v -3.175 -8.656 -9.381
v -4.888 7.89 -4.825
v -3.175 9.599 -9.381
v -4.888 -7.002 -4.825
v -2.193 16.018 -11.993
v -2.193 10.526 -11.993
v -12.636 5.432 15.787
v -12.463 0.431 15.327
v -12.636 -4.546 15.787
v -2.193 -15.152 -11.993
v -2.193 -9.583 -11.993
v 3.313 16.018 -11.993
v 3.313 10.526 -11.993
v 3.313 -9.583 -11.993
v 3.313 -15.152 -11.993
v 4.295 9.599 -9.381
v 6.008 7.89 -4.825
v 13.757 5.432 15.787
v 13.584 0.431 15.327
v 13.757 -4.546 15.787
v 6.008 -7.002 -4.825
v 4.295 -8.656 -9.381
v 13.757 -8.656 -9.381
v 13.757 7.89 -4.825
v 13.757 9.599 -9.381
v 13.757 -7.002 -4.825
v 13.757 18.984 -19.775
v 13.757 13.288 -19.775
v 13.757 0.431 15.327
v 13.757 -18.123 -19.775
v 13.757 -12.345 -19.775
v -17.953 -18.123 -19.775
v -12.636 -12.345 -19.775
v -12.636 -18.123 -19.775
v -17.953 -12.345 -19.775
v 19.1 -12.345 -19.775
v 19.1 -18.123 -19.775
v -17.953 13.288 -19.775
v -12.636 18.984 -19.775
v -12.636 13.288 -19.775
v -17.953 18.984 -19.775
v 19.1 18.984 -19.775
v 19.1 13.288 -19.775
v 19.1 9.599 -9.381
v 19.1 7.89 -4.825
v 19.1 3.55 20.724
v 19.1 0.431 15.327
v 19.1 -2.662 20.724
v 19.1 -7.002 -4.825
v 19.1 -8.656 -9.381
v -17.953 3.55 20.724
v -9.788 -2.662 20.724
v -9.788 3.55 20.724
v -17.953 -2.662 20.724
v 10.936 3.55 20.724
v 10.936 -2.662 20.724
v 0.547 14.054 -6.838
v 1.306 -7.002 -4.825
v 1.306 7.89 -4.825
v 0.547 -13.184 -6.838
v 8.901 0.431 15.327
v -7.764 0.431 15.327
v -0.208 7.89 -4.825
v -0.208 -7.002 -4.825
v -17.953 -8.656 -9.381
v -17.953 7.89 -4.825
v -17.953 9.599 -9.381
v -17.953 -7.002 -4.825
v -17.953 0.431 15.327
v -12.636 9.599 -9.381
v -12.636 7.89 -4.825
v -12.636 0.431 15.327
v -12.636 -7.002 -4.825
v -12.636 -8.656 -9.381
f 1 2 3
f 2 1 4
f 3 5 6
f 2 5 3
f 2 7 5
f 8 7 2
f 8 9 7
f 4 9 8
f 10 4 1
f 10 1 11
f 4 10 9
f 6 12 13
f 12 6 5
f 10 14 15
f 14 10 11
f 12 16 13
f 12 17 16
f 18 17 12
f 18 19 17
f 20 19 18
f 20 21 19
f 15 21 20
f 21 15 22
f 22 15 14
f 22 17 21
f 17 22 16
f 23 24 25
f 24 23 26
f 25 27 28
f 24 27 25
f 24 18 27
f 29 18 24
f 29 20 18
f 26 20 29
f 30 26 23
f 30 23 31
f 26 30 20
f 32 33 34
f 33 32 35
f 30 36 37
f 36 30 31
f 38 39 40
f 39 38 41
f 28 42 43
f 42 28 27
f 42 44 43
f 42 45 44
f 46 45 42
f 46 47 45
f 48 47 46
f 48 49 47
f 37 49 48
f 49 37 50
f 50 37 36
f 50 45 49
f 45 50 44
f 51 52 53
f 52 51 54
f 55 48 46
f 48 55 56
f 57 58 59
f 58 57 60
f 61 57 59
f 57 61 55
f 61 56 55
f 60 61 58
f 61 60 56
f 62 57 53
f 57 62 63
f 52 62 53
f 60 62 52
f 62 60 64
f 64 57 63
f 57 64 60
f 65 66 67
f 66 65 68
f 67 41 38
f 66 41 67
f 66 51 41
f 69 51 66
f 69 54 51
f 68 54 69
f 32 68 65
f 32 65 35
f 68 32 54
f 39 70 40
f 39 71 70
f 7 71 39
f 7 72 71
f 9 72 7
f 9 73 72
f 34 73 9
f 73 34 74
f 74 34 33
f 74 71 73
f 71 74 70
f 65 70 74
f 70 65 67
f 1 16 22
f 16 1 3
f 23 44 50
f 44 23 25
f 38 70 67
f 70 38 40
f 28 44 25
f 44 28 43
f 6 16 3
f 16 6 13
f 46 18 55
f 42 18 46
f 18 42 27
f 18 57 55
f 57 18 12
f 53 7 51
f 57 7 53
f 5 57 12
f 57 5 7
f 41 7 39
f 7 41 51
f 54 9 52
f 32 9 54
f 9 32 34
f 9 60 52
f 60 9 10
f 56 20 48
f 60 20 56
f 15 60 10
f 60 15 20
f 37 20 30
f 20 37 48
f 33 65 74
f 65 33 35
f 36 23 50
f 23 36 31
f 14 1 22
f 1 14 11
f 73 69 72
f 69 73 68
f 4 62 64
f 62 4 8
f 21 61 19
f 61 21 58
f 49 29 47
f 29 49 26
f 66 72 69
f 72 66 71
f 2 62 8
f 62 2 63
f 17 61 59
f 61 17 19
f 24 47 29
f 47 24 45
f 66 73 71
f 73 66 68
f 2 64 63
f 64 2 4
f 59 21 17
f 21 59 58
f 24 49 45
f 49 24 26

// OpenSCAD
intersection() {
    //rotate([0,0,0]) translate([-3,0,0]) linear_extrude(100, center=true) text("M", size=40, halign="center", valign="center", font="open sans extrabold");
    rotate([90,0,0]) linear_extrude(100, center=true) text("M", size=40, halign="center", valign="center", font="open sans extrabold");
    rotate([90,0,90]) linear_extrude(100, center=true) text("A", size=40, halign="center", valign="center", font="open sans extrabold");
    
}
